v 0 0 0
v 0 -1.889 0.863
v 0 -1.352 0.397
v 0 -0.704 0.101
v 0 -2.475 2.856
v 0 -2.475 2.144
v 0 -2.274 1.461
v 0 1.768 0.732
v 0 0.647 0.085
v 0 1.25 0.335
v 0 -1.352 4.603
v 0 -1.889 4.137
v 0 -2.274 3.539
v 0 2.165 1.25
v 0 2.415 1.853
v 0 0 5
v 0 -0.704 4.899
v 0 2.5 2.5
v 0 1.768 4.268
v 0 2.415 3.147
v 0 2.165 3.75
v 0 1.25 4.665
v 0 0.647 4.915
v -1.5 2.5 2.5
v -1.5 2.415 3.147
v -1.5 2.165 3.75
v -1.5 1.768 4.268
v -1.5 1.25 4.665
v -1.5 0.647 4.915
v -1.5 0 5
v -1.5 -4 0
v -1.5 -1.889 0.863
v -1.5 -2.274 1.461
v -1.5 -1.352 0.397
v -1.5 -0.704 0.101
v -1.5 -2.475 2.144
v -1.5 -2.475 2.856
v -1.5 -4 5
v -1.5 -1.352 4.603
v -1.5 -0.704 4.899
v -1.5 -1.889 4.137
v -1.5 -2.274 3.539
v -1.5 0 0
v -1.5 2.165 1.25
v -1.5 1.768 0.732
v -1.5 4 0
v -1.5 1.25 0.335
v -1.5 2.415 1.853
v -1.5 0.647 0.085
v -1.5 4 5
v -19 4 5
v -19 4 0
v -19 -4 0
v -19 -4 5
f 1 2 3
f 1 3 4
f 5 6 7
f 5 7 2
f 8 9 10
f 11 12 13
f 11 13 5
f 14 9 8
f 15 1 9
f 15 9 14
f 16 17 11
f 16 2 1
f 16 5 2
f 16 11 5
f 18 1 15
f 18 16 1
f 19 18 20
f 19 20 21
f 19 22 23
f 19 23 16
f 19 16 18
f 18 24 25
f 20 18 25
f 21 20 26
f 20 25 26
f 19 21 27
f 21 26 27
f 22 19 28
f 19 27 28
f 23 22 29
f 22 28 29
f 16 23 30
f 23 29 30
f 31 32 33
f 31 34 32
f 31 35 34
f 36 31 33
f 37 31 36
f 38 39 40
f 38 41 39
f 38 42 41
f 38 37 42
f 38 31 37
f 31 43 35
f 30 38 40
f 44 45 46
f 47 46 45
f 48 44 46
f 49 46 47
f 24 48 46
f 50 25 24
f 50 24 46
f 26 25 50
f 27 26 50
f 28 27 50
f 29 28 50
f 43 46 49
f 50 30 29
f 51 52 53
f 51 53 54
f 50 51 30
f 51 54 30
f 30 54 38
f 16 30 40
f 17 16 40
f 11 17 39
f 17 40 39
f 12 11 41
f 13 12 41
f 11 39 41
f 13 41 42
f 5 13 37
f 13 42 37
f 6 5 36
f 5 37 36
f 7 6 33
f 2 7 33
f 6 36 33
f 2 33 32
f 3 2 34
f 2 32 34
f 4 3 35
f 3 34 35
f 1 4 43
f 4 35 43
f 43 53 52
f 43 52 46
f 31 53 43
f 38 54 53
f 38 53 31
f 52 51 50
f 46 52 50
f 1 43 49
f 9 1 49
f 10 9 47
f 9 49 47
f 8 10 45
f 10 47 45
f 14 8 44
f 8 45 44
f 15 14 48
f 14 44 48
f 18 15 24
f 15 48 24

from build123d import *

# Parameters (mm, degrees)
F0_W     = 17.5
F0_H     = 5
F1_DEPTH = 4
F3_DEPTH = 1.5


with BuildPart() as f1:
    # F0 (on Front) → F1 (new body, symmetric)
    with BuildSketch(Plane.XZ):
        with Locations((-10.25, 2.5)):
            Rectangle(F0_W, F0_H)
    extrude(amount=F1_DEPTH, both=True)

    # F2 (on face) → F3 (join)
    with BuildSketch(Plane.YZ.offset(-1.5)):
        with BuildLine():
            ThreePointArc((0, 0), (1.767767, 0.732233), (2.5, 2.5))
            ThreePointArc((2.5, 2.5), (1.767767, 4.267767), (0, 5))
            ThreePointArc((0, 5), (-2.5, 2.5), (0, 0))
        make_face()
    extrude(amount=F3_DEPTH)


solid = f1.part
